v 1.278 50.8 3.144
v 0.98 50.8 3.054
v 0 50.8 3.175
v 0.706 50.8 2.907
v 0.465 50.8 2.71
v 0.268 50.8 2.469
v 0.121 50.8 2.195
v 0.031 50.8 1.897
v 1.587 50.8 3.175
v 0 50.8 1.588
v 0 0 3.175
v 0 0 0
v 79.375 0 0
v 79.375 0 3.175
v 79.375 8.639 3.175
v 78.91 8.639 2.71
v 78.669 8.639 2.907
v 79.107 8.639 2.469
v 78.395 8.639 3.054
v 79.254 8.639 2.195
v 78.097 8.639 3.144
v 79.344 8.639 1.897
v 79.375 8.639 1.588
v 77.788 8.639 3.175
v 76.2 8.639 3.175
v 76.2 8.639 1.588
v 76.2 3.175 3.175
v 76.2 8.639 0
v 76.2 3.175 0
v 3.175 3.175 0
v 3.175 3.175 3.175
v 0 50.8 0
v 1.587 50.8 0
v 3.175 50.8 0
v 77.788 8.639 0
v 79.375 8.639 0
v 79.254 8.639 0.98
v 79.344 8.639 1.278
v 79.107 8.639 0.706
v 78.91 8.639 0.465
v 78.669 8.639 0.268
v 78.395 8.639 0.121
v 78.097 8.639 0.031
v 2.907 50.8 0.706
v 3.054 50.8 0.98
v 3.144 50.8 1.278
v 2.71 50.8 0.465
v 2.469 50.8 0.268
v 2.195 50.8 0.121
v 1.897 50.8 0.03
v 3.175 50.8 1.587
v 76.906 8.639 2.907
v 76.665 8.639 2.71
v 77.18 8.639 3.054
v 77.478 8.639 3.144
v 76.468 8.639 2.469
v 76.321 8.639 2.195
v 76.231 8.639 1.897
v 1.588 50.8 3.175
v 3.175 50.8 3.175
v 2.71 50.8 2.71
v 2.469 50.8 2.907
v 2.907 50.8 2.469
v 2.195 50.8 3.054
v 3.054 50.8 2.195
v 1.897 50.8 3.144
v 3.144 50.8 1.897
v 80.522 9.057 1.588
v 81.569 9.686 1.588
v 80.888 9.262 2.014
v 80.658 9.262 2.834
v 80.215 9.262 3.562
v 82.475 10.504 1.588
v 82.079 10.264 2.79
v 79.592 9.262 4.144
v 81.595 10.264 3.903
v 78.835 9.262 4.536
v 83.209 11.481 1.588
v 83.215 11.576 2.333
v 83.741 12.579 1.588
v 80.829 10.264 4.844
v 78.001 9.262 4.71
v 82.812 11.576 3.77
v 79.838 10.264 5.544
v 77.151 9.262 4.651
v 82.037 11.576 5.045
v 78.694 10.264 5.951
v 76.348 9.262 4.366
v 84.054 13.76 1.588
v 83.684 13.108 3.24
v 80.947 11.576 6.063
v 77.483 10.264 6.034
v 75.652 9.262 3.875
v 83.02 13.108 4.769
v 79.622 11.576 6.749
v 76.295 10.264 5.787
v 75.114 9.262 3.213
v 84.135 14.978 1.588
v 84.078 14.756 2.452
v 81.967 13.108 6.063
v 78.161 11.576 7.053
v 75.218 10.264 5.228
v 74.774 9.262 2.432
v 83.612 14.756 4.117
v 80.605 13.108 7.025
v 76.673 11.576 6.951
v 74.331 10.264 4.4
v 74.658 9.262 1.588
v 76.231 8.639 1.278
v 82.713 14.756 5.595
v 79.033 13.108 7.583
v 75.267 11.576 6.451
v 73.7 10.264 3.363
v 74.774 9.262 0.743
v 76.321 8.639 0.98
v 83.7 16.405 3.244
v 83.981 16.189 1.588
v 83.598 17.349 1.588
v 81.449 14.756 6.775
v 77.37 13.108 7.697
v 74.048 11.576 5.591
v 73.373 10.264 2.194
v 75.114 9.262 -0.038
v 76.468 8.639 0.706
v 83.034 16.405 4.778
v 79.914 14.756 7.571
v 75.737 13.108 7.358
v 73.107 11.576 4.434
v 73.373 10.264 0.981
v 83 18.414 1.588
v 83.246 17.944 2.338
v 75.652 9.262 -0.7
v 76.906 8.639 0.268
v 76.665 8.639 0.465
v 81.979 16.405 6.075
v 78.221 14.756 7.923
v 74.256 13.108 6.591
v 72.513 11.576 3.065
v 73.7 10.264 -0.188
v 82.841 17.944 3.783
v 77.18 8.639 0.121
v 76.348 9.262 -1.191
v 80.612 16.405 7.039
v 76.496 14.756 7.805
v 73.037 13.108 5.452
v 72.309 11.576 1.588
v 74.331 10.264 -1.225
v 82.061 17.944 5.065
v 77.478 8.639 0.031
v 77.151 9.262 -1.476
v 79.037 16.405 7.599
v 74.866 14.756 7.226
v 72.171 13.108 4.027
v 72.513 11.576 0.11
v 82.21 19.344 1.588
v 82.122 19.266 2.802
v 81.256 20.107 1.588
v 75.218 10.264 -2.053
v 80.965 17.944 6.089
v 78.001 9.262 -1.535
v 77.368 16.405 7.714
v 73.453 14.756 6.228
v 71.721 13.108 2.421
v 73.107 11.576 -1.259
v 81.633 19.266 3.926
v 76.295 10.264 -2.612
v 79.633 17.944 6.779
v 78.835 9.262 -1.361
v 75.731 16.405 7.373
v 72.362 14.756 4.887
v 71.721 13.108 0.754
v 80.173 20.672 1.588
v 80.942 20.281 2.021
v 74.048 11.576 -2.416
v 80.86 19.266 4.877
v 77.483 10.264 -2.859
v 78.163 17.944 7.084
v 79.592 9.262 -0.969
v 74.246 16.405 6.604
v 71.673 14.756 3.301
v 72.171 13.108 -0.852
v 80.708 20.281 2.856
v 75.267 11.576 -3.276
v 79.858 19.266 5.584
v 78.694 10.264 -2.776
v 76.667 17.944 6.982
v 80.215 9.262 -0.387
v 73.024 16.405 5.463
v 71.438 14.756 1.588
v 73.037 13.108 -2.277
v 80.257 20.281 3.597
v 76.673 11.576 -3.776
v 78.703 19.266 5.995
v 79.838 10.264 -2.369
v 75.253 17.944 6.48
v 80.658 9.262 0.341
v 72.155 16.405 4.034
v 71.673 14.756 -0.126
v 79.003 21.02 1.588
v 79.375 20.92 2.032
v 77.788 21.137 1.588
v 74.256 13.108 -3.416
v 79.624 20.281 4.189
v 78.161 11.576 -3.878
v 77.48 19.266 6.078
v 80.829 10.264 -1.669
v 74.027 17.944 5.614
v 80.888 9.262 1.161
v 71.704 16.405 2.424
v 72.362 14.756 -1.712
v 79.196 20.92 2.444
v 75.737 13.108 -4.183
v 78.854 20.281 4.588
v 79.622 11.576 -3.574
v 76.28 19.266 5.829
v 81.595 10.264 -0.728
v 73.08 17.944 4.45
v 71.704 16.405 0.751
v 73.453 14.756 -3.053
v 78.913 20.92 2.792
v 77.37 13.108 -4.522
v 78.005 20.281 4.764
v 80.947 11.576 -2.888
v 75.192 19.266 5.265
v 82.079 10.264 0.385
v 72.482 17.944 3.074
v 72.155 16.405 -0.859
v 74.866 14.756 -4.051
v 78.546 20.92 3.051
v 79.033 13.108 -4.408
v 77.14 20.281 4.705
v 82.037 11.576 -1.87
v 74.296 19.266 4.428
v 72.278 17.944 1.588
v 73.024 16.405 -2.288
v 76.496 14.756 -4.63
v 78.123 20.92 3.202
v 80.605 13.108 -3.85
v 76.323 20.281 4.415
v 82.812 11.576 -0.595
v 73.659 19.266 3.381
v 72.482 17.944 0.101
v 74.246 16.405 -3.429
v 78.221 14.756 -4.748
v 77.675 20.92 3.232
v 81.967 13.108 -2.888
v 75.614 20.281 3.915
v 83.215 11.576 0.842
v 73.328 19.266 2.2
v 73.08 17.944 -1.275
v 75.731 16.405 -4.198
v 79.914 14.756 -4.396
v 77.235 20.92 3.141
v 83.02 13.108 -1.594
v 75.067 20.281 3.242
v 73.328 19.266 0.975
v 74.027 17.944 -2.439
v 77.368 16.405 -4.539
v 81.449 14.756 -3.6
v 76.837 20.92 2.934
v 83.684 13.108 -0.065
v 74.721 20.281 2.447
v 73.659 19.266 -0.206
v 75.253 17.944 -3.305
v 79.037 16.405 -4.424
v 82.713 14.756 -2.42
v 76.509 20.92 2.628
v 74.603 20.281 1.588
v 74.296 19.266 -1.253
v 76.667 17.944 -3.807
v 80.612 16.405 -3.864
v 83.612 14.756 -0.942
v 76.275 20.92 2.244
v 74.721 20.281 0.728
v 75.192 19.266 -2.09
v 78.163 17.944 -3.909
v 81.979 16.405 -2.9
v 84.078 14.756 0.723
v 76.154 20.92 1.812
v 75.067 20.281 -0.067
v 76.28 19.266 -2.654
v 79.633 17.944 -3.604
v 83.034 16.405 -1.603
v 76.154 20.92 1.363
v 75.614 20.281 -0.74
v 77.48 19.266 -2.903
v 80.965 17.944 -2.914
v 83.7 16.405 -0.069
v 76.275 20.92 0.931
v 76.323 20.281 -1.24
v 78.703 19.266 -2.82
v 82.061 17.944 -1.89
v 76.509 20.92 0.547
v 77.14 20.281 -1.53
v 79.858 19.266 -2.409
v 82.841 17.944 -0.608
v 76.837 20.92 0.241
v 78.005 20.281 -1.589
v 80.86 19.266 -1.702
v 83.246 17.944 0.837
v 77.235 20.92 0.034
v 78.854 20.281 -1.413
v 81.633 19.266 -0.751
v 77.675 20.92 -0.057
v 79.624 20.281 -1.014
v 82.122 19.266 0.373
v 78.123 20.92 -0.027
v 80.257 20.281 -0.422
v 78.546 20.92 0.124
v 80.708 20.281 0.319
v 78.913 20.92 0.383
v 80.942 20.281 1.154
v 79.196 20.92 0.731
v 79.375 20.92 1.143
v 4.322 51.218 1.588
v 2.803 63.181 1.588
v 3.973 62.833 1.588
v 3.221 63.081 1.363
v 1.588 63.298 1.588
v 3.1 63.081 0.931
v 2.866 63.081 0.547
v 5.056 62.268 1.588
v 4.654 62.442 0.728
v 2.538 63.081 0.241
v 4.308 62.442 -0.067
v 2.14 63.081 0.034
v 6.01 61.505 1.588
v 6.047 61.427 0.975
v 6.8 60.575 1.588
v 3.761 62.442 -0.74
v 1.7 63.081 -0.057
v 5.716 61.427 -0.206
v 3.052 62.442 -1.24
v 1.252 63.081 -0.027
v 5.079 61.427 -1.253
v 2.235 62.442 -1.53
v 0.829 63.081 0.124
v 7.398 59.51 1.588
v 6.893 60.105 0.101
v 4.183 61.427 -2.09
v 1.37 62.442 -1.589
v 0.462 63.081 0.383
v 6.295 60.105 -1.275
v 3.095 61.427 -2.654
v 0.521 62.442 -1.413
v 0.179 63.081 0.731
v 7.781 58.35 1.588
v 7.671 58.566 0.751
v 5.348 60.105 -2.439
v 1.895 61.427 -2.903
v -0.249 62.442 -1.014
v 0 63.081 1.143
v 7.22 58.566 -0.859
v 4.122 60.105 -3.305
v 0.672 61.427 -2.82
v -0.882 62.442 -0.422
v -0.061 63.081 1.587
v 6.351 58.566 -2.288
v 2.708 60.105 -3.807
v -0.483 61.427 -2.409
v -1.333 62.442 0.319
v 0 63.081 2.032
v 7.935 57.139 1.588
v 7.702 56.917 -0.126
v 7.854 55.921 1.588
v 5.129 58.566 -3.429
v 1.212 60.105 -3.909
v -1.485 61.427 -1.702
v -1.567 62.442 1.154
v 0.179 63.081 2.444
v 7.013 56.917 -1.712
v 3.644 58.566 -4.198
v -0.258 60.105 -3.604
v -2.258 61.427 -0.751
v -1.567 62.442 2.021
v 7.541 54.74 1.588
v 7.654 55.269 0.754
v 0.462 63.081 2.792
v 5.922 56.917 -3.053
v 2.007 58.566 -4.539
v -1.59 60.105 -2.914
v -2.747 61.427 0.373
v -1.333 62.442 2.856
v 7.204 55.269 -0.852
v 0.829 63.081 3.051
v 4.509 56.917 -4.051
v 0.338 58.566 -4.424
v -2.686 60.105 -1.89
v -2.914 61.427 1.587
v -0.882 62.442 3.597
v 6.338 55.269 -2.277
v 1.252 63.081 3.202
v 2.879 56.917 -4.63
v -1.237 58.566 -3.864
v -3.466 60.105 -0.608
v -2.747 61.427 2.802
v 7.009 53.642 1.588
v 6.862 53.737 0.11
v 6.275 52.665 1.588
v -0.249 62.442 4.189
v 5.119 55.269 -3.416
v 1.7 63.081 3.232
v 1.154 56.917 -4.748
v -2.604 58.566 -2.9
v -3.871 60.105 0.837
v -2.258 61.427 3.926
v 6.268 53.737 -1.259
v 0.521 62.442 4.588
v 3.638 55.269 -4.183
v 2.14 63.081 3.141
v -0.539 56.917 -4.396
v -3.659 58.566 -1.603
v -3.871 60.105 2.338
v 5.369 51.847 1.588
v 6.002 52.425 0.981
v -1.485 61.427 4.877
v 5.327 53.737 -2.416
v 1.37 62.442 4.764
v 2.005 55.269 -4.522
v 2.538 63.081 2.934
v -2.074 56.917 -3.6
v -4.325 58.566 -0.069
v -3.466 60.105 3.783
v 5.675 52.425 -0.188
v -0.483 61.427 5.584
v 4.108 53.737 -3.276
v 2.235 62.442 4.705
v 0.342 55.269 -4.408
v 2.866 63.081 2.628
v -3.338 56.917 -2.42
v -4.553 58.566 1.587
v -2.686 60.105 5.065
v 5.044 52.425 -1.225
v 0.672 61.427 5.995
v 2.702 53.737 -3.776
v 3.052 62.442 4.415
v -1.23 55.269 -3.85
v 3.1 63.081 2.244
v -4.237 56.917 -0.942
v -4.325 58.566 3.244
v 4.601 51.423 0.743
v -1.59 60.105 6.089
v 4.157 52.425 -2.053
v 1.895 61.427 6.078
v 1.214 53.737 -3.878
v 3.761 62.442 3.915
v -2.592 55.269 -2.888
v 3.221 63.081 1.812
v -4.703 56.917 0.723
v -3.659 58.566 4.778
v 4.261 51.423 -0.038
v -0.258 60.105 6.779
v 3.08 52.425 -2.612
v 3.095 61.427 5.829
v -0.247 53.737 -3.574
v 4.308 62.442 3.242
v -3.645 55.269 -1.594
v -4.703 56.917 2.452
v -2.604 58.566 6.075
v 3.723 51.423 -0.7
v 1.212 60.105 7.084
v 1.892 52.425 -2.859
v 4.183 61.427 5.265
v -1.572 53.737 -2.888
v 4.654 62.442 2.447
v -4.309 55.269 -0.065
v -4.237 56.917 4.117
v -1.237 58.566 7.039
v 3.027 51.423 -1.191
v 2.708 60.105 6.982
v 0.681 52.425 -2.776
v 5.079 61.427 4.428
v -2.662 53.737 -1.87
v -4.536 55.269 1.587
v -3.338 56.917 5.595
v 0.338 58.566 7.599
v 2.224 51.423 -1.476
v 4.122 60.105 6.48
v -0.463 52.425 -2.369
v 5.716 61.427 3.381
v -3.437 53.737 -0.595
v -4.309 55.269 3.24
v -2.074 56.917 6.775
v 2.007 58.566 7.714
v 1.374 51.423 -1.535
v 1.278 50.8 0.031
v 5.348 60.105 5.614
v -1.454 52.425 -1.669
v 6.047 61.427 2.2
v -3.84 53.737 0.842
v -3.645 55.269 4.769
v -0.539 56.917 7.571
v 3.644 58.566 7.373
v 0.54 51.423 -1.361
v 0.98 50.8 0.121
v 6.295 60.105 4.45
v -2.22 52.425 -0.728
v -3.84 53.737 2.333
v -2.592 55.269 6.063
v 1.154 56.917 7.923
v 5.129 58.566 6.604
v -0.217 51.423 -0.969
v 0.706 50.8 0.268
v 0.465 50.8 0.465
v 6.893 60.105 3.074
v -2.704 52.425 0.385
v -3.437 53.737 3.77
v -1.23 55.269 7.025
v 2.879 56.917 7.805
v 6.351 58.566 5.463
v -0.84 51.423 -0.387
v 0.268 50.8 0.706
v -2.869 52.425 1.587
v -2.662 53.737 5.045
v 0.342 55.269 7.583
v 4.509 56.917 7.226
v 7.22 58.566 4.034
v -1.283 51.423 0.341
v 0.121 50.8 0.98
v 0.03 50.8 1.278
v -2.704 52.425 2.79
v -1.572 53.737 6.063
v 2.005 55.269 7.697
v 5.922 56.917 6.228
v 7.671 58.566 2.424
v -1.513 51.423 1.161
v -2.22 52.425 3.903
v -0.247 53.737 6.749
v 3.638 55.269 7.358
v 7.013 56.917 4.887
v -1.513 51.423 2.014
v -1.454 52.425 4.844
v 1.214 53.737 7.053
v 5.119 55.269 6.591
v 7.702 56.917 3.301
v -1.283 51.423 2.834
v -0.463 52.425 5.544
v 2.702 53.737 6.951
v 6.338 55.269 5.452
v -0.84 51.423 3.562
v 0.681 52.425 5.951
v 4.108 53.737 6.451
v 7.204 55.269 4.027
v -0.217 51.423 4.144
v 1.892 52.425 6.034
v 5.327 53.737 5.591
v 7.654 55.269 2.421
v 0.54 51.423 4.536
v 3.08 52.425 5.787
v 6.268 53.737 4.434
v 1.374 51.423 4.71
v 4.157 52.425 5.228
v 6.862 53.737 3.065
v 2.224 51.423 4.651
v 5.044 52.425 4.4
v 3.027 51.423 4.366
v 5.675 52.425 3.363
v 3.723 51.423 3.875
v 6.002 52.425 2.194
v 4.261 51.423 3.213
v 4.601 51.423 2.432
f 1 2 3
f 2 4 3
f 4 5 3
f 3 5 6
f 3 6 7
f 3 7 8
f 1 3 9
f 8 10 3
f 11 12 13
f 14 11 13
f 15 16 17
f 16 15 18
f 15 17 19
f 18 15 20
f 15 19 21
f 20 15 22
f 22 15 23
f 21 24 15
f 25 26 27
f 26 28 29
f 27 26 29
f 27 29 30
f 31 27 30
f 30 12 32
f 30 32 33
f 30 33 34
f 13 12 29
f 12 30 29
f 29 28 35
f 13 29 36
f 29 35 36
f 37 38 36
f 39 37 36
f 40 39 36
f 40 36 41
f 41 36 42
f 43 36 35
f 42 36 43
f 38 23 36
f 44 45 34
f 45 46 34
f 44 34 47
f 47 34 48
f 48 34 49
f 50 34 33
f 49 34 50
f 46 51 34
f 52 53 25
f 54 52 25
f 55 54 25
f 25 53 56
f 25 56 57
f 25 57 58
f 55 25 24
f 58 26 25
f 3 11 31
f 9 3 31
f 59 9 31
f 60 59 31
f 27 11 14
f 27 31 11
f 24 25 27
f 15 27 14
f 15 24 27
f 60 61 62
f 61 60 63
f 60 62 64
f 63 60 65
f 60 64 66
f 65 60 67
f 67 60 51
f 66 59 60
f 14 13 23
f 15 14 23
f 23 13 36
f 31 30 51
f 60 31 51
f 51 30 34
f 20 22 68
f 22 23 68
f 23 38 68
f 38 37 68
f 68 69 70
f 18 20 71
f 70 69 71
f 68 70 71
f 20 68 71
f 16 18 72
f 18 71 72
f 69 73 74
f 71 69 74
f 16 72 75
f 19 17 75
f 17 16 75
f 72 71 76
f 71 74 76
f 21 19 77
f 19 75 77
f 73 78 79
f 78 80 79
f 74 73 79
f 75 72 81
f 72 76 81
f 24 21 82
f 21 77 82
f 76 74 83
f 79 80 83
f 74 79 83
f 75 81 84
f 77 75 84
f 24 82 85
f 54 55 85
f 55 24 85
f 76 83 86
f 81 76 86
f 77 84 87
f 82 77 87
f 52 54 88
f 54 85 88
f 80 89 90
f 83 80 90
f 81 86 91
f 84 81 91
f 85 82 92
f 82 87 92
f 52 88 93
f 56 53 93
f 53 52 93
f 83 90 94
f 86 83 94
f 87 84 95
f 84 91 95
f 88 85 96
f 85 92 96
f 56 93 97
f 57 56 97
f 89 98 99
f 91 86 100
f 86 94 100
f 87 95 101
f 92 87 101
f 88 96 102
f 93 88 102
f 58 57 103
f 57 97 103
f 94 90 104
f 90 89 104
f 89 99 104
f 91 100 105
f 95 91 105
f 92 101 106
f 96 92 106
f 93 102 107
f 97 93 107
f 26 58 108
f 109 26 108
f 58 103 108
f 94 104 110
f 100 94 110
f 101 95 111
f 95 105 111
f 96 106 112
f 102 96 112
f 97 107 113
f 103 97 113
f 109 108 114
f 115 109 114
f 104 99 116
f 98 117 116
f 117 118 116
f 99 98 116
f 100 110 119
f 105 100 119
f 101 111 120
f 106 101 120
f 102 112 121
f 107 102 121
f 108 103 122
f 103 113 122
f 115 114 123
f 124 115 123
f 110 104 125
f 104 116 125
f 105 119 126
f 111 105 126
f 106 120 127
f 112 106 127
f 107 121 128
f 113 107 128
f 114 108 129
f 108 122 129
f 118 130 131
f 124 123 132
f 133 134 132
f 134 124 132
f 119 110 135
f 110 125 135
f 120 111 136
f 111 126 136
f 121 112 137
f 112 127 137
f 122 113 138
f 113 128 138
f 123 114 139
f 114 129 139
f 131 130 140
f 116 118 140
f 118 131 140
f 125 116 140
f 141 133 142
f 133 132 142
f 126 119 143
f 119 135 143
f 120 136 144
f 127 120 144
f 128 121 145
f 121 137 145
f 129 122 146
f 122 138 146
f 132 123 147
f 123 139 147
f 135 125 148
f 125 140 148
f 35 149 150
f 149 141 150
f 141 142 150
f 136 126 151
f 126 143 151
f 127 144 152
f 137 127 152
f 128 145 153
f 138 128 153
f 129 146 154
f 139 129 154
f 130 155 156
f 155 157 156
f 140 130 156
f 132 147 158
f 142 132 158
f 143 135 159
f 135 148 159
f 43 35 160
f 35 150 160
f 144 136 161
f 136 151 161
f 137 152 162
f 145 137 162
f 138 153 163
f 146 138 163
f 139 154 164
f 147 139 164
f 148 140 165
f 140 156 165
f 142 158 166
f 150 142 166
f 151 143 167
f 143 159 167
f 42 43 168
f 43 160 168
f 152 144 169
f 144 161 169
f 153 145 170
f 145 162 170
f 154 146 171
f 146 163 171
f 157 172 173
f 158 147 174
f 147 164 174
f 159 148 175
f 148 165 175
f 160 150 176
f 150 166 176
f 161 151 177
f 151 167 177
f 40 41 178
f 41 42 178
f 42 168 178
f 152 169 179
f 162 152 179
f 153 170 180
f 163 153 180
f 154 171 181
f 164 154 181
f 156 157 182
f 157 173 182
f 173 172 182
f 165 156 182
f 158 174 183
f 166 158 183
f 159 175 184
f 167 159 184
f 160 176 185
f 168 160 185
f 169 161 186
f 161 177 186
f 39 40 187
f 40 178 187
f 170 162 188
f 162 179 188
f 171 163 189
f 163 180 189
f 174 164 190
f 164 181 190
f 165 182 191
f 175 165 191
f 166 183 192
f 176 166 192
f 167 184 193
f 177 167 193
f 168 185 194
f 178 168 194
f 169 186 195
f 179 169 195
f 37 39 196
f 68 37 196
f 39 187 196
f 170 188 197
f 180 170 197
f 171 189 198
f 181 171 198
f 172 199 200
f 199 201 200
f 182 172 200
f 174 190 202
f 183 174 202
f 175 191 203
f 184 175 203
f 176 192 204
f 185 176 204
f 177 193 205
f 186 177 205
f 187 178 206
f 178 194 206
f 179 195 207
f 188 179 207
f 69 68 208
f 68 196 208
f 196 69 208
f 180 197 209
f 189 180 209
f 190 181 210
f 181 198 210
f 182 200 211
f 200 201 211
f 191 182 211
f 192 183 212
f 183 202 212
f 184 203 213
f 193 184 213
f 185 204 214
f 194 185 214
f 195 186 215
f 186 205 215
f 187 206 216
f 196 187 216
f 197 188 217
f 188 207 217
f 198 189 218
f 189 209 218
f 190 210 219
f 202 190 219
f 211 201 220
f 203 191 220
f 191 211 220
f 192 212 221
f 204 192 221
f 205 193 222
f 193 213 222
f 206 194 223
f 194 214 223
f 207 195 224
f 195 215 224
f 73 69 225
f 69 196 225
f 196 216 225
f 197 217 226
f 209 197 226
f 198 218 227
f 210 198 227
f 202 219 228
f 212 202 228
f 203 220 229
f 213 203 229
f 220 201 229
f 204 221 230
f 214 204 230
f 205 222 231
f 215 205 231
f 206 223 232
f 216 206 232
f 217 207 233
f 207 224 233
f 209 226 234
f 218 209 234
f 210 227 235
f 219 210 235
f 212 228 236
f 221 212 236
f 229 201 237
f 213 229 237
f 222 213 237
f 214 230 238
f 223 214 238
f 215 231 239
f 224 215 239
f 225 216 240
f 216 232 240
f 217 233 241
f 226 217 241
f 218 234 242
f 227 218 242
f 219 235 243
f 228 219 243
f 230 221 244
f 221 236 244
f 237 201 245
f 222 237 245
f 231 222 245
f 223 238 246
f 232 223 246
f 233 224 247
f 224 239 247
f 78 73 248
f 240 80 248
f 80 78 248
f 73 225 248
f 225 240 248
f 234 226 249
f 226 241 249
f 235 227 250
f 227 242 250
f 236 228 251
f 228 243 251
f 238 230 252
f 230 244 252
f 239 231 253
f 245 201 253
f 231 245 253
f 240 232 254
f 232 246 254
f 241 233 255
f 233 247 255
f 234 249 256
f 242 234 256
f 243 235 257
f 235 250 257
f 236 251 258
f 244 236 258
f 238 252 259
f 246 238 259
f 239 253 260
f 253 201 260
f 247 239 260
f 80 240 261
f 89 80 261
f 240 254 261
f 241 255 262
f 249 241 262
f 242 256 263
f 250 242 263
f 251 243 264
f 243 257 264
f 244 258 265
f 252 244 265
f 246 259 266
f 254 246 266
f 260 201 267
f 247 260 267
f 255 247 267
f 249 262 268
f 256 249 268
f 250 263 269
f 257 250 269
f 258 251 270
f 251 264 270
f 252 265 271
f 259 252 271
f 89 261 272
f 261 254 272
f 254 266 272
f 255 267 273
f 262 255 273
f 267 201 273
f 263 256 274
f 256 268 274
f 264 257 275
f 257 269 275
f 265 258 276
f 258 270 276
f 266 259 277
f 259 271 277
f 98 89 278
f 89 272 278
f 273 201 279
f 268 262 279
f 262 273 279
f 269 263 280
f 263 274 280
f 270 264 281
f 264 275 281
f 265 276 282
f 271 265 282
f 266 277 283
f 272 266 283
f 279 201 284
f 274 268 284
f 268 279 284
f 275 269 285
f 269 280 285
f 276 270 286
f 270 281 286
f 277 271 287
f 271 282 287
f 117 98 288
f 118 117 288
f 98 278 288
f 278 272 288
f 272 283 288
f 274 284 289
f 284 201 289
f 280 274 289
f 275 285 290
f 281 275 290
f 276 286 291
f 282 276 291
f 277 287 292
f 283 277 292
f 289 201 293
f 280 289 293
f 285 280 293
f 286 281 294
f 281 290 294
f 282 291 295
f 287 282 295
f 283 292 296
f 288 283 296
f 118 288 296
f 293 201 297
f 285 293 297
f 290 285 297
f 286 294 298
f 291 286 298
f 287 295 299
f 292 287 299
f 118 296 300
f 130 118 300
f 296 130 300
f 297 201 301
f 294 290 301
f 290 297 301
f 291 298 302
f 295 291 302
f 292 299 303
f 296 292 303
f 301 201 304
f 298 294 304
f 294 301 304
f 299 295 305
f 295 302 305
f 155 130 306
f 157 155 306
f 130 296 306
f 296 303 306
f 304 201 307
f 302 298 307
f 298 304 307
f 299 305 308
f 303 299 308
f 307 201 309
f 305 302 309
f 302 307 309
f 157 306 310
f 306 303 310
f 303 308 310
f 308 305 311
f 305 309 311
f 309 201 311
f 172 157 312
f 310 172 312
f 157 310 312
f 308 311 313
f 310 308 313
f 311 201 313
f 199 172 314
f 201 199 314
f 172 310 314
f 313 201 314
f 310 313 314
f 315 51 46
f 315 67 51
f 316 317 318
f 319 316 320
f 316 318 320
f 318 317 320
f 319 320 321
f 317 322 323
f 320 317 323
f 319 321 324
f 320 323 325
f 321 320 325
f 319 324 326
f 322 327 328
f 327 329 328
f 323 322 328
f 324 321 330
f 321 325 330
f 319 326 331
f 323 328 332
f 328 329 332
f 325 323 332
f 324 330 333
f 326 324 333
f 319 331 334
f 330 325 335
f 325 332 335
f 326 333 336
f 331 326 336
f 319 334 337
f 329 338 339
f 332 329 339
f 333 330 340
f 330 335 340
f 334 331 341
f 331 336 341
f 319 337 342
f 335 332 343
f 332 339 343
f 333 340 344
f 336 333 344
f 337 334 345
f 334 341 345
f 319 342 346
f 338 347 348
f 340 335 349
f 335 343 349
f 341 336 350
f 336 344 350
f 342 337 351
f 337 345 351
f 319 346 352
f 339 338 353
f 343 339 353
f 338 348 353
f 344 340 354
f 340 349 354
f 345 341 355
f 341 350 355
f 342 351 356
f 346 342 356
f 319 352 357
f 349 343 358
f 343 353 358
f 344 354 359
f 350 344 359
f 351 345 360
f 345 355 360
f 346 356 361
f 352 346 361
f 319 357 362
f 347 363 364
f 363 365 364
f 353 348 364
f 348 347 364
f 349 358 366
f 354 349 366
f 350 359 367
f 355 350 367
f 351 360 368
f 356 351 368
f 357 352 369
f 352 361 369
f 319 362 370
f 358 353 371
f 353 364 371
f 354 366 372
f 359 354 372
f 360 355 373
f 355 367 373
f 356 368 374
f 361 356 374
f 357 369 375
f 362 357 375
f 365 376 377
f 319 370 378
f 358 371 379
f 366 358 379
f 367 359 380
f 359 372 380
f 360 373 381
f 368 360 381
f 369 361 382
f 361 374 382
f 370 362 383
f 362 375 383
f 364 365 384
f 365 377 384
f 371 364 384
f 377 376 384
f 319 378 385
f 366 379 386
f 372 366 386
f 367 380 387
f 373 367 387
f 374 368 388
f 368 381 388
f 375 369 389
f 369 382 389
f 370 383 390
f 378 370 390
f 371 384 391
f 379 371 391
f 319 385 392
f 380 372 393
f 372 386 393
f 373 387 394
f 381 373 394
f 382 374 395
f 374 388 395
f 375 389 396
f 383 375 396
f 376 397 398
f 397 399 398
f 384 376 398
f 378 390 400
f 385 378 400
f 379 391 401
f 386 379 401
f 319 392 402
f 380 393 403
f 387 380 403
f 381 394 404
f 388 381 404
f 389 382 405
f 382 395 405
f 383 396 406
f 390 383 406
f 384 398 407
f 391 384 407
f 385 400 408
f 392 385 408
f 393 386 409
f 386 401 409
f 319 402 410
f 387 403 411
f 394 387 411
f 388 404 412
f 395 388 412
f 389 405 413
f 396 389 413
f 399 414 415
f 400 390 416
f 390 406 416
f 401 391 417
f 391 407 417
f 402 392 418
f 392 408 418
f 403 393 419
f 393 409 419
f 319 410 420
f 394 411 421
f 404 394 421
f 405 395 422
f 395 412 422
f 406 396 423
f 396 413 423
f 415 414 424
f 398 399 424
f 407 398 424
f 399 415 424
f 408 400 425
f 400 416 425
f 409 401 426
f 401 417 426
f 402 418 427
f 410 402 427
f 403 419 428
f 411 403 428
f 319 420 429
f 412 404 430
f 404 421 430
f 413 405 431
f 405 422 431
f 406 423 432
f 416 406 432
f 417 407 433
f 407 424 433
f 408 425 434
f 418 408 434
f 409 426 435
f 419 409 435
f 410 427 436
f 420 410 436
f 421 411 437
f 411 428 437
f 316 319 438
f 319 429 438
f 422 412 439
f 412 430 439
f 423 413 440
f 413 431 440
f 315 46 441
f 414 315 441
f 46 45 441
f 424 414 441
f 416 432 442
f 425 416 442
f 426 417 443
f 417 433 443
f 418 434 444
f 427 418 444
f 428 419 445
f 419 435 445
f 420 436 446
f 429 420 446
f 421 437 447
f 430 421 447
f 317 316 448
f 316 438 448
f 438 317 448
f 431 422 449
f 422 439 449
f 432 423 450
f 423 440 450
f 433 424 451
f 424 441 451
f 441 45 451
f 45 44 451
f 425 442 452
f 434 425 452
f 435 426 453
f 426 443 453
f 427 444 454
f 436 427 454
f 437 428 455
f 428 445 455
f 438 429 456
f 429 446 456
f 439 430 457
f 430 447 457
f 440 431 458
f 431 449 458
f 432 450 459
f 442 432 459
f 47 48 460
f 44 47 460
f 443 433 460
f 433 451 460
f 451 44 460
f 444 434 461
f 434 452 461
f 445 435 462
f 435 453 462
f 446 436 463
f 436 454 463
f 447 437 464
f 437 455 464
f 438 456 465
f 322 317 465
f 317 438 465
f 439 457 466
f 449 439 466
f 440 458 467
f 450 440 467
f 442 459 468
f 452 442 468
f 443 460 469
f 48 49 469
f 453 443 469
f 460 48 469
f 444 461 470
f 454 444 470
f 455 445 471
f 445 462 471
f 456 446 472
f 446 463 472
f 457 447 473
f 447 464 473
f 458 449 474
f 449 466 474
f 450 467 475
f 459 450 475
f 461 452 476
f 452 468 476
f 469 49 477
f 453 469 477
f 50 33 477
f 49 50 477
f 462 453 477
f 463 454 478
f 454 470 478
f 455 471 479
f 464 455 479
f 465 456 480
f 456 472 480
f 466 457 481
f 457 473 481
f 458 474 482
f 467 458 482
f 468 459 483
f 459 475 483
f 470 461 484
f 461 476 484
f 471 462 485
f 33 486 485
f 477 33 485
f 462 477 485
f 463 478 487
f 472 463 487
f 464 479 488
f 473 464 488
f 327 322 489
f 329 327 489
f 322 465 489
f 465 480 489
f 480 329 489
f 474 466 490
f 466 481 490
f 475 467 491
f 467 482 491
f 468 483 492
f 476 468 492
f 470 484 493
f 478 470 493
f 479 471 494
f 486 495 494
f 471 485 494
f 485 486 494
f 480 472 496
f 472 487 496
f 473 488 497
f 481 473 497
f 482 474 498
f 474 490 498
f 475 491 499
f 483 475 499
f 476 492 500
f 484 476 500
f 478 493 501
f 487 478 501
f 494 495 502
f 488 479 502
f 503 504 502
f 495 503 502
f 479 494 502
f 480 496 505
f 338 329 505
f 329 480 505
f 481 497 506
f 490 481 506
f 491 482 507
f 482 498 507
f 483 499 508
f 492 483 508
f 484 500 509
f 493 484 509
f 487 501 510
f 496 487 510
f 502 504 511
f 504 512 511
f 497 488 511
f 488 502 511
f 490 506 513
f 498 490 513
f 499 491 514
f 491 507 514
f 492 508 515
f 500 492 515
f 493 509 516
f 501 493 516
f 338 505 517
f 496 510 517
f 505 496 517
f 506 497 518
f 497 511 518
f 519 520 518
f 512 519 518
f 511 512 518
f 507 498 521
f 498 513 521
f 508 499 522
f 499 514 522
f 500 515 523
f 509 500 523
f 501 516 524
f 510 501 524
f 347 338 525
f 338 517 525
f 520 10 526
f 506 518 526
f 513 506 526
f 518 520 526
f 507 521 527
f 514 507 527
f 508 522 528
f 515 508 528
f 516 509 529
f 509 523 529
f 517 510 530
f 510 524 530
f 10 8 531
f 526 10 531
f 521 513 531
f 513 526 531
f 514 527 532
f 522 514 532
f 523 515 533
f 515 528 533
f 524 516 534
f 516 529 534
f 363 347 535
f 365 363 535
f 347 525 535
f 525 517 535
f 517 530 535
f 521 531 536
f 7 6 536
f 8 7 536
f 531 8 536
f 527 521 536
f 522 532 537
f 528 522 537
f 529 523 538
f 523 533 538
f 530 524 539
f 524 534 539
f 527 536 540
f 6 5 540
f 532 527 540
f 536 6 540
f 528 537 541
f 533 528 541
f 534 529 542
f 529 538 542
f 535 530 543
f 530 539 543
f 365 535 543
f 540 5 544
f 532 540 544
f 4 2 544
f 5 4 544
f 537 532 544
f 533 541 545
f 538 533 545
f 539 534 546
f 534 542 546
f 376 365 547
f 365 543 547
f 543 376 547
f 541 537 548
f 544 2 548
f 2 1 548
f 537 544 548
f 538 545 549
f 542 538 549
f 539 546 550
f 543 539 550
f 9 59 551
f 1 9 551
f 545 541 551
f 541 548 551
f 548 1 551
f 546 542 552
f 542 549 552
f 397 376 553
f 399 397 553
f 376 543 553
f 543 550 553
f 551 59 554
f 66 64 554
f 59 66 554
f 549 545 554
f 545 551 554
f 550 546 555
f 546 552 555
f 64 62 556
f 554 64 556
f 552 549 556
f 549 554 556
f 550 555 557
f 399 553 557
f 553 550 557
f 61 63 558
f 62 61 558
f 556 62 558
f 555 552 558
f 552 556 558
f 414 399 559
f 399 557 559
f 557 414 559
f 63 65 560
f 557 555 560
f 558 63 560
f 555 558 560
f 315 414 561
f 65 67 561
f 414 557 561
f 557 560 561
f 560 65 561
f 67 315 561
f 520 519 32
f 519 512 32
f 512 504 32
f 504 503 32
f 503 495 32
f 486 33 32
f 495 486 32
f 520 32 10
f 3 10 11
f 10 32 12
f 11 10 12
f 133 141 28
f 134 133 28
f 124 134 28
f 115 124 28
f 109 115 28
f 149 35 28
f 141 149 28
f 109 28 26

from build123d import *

# Parameters (mm, degrees)
BOSS_EXTRUDE1_DEPTH = 3.175


with BuildPart() as part:
    # Sketch1 → Boss-Extrude1 (new body)
    with BuildSketch(Plane.XY):
        Polygon((0, 0), (79.375, 0), (79.375, 8.638996592), (76.2, 8.638996592), (76.2, 3.175), (3.175, 3.175), (3.175, 50.8), (0, 50.8), align=None)
    extrude(amount=BOSS_EXTRUDE1_DEPTH)

    # Sketch2 → Revolve1 (revolve)
    with BuildSketch(Plane.XY.offset(1.5875)):
        with BuildLine():
            Line((1.5875, 50.598361062), (1.5875, 63.298361062))
            ThreePointArc((1.5875, 63.298361062), (7.9375, 56.948361062), (1.5875, 50.598361062))
        make_face()
    revolve(axis=Axis((1.5875, 50.598361062, 1.5875), (0, 1, 0)))

    # Sketch3 → Revolve2 (revolve)
    with BuildSketch(Plane.XY.offset(1.5875)):
        with BuildLine():
            Line((77.7875, 21.137357655), (77.7875, 8.437357655))
            ThreePointArc((77.7875, 8.437357655), (84.1375, 14.787357655), (77.7875, 21.137357655))
        make_face()
    revolve(axis=Axis((77.7875, 21.137357655, 1.5875), (0, -1, 0)))


solid = part.part
